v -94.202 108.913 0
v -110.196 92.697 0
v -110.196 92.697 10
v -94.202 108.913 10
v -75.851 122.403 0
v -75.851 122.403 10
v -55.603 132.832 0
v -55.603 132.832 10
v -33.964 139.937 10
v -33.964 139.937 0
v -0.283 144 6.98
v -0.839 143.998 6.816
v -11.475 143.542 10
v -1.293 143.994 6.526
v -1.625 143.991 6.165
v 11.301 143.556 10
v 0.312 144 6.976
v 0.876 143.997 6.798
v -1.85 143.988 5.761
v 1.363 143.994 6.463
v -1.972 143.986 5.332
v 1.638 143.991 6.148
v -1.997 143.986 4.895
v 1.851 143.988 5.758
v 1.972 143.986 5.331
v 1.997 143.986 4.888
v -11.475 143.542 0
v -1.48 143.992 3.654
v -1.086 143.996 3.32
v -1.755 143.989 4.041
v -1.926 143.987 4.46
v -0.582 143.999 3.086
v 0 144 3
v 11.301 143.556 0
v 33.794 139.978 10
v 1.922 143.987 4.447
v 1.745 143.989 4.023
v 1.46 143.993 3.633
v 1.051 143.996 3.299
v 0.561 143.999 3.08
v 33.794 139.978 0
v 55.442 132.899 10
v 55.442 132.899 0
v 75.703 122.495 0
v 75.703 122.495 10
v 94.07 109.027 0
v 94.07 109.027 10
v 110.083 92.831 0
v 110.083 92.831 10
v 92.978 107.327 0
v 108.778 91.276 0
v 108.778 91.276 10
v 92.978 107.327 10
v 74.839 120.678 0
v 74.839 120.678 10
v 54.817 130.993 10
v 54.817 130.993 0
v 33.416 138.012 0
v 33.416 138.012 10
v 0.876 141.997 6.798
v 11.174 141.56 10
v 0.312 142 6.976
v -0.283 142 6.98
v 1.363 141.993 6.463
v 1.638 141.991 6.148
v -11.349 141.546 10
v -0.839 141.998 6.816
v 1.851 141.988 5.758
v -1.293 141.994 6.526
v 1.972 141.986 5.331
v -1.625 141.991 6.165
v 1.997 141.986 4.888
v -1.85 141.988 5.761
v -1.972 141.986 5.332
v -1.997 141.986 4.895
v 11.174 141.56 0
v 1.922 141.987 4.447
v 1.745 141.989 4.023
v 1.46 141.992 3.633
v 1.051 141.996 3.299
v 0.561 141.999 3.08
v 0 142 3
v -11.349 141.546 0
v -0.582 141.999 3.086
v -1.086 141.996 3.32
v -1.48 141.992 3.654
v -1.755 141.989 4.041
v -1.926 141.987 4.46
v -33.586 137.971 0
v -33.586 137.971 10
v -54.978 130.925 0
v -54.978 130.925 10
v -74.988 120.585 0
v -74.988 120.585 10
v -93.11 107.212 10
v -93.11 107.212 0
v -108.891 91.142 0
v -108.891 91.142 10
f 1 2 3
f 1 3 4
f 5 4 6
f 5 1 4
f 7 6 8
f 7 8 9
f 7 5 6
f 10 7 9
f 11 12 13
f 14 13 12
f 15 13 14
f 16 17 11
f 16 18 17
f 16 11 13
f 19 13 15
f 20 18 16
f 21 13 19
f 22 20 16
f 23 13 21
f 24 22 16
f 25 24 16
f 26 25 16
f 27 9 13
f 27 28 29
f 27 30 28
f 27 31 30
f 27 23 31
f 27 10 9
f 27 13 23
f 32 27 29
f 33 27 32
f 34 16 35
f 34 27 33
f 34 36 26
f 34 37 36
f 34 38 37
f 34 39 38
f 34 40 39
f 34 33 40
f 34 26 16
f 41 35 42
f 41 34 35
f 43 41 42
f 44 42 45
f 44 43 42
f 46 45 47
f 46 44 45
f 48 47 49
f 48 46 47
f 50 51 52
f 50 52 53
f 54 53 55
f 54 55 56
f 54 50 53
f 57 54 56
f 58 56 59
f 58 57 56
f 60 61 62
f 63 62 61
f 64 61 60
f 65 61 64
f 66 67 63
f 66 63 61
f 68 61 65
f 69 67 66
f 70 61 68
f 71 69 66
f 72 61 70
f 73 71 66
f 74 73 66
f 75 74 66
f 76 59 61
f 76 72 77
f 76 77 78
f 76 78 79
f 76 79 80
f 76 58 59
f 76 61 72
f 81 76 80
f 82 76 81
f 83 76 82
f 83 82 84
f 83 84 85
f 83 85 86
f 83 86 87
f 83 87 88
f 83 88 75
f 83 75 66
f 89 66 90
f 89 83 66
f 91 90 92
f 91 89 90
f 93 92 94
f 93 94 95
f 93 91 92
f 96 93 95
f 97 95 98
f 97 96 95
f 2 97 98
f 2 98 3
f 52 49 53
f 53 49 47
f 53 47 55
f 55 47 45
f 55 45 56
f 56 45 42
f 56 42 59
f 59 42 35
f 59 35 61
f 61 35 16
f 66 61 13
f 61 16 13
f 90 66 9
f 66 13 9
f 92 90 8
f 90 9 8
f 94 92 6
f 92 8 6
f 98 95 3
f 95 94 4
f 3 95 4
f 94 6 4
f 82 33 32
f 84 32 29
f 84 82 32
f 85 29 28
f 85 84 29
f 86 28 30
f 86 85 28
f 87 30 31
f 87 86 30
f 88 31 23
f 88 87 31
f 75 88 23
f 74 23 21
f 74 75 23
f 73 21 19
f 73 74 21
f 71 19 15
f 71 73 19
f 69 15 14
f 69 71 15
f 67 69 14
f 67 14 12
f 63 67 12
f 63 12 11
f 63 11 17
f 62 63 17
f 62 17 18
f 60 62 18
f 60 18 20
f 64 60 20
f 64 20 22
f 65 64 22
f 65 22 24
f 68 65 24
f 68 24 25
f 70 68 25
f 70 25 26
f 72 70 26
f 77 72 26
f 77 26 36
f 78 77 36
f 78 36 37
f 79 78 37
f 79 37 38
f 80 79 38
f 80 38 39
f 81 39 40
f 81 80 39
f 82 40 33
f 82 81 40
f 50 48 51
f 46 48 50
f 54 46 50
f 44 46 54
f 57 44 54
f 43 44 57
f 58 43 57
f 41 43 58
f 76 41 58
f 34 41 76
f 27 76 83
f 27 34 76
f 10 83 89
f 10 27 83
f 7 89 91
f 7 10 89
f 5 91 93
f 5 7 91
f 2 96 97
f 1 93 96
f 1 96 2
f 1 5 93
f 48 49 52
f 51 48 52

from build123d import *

# Parameters (mm, degrees)
BOSS_EXTRU_1_DEPTH           = 10
ENL_V_MAT_EXTRU_1_REACH      = 183.602
ENL_V_MAT_EXTRU_1_END_RADIUS = 144
ESQUISSE3_R                  = 2


with BuildPart() as part:
    # Esquisse2 → Boss.-Extru.1 (new body)
    with BuildSketch(Plane.XY):
        with BuildLine():
            Line((-108.89070765, 91.141723636), (-110.196113775, 92.697446075))
            ThreePointArc((-110.196113775, 92.697446075), (-0.087455631, 143.999973443), (110.083436481, 92.831228649))
            Line((110.083436481, 92.831228649), (108.778310923, 91.275840575))
            ThreePointArc((108.778310923, 91.275840575), (-0.087493397, 141.999973045), (-108.89070765, 91.141723636))
        make_face()
    extrude(amount=BOSS_EXTRU_1_DEPTH)

    # Enlèv. mat.-Extru.1: up to this cylinder (the profile starts inside it)
    enl_v_mat_extru_1_end = Plane(origin=(0, 0, 5), z_dir=(0, 0, -1)) * Cylinder(ENL_V_MAT_EXTRU_1_END_RADIUS, 656.204, mode=Mode.PRIVATE)
    # Esquisse3 → Enlèv. mat.-Extru.1 (cut, up to the surface)
    with BuildSketch(Plane(origin=(0, 0, 0), x_dir=(1, 0, 0), z_dir=(0, 1, 0)), mode=Mode.PRIVATE) as enl_v_mat_extru_1_sk1:
        with Locations(Location((0, -5, 0), (0, 0, 90))):
            Circle(ESQUISSE3_R)
    enl_v_mat_extru_1_tool1 = extrude(enl_v_mat_extru_1_sk1.sketch, amount=ENL_V_MAT_EXTRU_1_REACH, mode=Mode.PRIVATE) & enl_v_mat_extru_1_end
    add(enl_v_mat_extru_1_tool1.solids().sort_by_distance((0, 0, 5))[0], mode=Mode.SUBTRACT)


solid = part.part
